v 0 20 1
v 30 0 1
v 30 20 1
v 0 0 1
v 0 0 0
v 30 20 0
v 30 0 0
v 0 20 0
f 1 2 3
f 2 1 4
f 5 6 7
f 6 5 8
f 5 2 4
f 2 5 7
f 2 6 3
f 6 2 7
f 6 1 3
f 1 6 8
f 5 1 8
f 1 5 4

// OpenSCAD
// Plant Box Probe Sensor Mount
// by: knarfishness
// for: Diesel Powered Robotics
// v1.0, 03-27-2013

module probe_mount()
{
	cube([30,20,1]);
}

module hygro()
{

}

module temp()
{

}

module light()
{

}

probe_mount();
